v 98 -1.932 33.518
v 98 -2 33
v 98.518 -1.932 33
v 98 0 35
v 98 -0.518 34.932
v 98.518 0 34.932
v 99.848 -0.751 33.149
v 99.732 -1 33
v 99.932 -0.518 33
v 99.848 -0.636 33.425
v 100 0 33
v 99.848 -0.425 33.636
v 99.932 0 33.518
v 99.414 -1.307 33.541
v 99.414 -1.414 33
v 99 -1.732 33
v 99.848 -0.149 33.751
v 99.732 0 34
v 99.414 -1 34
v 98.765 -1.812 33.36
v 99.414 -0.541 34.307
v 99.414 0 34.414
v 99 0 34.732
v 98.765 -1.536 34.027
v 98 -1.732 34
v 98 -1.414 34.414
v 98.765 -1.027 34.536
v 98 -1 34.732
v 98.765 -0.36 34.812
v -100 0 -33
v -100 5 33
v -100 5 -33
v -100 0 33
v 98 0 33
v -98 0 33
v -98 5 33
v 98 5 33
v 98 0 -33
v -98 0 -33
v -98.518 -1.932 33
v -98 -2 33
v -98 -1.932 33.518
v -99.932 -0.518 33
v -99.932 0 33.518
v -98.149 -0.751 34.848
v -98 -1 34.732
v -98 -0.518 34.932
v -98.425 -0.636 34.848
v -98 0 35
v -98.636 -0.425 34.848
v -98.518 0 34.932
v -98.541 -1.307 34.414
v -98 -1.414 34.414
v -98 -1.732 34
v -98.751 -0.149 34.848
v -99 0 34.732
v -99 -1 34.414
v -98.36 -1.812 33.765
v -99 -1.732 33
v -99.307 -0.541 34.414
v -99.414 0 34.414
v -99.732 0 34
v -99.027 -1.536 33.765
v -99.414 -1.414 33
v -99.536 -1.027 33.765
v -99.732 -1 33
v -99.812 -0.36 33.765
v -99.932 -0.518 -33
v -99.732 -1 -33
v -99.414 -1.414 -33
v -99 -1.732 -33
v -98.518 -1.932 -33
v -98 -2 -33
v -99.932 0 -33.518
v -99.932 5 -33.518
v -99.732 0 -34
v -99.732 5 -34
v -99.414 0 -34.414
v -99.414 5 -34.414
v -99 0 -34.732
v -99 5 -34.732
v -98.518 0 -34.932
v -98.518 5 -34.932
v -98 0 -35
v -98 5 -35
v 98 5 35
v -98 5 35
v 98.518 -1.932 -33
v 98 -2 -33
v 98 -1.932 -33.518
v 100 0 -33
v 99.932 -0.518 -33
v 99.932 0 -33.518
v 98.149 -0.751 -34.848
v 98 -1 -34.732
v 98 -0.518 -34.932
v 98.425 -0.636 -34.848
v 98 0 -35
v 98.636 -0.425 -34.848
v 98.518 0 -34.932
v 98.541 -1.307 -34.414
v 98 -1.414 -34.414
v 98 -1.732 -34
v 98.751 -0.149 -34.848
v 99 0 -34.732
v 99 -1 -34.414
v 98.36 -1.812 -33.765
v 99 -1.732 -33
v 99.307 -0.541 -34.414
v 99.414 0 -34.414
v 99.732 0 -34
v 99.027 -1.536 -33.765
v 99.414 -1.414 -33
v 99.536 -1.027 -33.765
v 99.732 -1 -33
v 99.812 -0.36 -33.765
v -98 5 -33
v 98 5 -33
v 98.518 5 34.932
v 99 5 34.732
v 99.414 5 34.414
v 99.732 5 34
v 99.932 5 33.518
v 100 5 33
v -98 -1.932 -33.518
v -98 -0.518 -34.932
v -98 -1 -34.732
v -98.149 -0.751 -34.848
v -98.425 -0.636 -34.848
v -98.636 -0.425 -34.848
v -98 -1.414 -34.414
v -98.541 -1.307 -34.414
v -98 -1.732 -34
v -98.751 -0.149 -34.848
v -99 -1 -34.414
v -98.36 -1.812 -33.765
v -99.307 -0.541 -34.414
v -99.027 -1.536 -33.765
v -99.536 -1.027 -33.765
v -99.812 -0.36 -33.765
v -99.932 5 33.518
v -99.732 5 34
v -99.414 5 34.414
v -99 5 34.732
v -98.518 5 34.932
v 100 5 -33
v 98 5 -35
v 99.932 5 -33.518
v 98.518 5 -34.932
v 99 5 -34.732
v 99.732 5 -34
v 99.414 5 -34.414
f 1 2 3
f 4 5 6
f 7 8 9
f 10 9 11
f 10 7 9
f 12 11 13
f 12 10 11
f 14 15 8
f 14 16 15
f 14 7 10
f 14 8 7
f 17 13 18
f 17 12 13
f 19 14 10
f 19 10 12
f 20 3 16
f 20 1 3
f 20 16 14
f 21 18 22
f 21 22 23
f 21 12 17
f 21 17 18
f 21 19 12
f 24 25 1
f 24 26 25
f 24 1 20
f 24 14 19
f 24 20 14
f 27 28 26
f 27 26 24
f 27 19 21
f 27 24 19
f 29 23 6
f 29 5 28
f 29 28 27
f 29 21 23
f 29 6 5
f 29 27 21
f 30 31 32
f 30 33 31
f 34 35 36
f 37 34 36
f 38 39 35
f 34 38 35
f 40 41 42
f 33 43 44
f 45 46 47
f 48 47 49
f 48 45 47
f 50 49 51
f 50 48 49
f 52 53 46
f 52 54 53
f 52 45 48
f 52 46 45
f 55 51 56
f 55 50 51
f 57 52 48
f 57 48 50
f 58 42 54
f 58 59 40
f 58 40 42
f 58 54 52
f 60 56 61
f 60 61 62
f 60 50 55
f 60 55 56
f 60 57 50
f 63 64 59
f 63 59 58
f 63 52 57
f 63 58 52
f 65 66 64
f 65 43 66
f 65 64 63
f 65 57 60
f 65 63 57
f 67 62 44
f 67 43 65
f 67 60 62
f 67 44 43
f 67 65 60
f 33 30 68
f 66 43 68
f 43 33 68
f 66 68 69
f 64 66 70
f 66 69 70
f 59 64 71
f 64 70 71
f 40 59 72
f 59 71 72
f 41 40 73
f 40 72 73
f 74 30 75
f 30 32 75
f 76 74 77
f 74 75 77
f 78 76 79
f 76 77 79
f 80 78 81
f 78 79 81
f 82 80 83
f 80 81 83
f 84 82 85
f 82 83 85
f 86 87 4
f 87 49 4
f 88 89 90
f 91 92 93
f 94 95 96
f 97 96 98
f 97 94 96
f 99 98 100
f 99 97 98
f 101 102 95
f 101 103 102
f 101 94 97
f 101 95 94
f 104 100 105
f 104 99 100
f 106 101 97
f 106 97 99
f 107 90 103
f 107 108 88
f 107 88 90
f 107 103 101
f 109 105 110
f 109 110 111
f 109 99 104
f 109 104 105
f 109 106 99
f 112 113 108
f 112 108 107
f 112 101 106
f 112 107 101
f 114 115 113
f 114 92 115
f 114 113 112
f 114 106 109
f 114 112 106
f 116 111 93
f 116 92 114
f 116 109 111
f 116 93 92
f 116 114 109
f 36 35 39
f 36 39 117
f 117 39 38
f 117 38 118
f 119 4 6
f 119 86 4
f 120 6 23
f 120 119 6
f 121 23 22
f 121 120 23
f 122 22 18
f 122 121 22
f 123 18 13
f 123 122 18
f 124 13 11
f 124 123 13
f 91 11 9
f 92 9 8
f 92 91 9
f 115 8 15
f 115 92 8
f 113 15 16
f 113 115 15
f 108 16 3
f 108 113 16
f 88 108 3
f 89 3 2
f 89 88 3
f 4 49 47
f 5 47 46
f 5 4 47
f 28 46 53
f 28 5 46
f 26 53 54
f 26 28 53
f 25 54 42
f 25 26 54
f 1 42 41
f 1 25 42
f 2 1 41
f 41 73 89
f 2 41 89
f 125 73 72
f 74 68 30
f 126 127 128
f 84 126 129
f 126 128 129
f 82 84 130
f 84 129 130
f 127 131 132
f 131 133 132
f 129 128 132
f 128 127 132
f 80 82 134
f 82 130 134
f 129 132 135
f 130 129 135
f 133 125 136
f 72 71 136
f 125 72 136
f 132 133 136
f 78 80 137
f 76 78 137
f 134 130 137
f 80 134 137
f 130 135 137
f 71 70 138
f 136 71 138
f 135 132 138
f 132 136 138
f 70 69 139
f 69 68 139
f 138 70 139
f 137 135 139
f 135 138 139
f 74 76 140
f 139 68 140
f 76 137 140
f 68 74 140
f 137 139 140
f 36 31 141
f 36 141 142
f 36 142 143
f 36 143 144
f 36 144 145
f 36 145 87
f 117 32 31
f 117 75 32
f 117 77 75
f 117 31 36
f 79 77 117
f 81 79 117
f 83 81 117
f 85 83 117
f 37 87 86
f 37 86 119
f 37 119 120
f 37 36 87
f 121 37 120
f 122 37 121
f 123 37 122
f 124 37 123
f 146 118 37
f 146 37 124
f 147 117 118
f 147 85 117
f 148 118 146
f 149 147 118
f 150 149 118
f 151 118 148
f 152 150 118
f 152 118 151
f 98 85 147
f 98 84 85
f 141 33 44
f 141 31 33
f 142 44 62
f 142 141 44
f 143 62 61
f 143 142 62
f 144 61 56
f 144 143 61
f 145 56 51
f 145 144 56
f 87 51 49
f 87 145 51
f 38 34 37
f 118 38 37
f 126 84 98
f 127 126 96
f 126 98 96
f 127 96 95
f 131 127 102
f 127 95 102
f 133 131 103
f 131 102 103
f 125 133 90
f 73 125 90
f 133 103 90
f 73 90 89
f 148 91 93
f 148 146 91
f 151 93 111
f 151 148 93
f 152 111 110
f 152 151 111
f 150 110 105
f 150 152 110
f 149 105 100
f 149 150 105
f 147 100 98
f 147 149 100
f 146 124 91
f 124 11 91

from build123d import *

# Parameters (mm, degrees)
RECTANGLEBOX_DEPTH      = 5
RECTANGLEBOX_DEPTH_BACK = 2
SKETCHREC_W             = 200
SKETCHREC_H             = 70
RECTANGLER_R            = 2
RECTANGLEC_START        = -98
RECTANGLEC_OUTLINE_W    = 5
RECTANGLEC_OUTLINE_H    = 66
RECTANGLEC_DEPTH        = 196


# Read off the part's stored shape, not the designer's step: RectangleC
with BuildPart() as part:
    # SketchRec → RectangleBox (new, two sides: drawn at the far end of the back side and taken through both)
    with BuildSketch(Plane(origin=(0, 0, 0), x_dir=(1, 0, 0), z_dir=(0, 1, 0)).offset(-RECTANGLEBOX_DEPTH_BACK)):
        Rectangle(SKETCHREC_W, SKETCHREC_H)
    extrude(amount=RECTANGLEBOX_DEPTH + RECTANGLEBOX_DEPTH_BACK)

    # RectangleR
    rectangler_edges = [part.edges().sort_by_distance(p)[0] for p in [
        (-100, -2, 0),
        (0, -2, 35),
        (100, -2, 0),
        (0, -2, -35),
        (100, 1.5, 35),
        (-100, 1.5, 35),
        (-100, 1.5, -35),
        (100, 1.5, -35),
    ]]
    fillet(rectangler_edges, radius=RECTANGLER_R)

    # RectangleC outline → RectangleC (cut)
    with BuildSketch(Plane.YZ.offset(RECTANGLEC_START)):
        with Locations((2.5, 0)):
            Rectangle(RECTANGLEC_OUTLINE_W, RECTANGLEC_OUTLINE_H)
    extrude(amount=RECTANGLEC_DEPTH, mode=Mode.SUBTRACT)


solid = part.part
